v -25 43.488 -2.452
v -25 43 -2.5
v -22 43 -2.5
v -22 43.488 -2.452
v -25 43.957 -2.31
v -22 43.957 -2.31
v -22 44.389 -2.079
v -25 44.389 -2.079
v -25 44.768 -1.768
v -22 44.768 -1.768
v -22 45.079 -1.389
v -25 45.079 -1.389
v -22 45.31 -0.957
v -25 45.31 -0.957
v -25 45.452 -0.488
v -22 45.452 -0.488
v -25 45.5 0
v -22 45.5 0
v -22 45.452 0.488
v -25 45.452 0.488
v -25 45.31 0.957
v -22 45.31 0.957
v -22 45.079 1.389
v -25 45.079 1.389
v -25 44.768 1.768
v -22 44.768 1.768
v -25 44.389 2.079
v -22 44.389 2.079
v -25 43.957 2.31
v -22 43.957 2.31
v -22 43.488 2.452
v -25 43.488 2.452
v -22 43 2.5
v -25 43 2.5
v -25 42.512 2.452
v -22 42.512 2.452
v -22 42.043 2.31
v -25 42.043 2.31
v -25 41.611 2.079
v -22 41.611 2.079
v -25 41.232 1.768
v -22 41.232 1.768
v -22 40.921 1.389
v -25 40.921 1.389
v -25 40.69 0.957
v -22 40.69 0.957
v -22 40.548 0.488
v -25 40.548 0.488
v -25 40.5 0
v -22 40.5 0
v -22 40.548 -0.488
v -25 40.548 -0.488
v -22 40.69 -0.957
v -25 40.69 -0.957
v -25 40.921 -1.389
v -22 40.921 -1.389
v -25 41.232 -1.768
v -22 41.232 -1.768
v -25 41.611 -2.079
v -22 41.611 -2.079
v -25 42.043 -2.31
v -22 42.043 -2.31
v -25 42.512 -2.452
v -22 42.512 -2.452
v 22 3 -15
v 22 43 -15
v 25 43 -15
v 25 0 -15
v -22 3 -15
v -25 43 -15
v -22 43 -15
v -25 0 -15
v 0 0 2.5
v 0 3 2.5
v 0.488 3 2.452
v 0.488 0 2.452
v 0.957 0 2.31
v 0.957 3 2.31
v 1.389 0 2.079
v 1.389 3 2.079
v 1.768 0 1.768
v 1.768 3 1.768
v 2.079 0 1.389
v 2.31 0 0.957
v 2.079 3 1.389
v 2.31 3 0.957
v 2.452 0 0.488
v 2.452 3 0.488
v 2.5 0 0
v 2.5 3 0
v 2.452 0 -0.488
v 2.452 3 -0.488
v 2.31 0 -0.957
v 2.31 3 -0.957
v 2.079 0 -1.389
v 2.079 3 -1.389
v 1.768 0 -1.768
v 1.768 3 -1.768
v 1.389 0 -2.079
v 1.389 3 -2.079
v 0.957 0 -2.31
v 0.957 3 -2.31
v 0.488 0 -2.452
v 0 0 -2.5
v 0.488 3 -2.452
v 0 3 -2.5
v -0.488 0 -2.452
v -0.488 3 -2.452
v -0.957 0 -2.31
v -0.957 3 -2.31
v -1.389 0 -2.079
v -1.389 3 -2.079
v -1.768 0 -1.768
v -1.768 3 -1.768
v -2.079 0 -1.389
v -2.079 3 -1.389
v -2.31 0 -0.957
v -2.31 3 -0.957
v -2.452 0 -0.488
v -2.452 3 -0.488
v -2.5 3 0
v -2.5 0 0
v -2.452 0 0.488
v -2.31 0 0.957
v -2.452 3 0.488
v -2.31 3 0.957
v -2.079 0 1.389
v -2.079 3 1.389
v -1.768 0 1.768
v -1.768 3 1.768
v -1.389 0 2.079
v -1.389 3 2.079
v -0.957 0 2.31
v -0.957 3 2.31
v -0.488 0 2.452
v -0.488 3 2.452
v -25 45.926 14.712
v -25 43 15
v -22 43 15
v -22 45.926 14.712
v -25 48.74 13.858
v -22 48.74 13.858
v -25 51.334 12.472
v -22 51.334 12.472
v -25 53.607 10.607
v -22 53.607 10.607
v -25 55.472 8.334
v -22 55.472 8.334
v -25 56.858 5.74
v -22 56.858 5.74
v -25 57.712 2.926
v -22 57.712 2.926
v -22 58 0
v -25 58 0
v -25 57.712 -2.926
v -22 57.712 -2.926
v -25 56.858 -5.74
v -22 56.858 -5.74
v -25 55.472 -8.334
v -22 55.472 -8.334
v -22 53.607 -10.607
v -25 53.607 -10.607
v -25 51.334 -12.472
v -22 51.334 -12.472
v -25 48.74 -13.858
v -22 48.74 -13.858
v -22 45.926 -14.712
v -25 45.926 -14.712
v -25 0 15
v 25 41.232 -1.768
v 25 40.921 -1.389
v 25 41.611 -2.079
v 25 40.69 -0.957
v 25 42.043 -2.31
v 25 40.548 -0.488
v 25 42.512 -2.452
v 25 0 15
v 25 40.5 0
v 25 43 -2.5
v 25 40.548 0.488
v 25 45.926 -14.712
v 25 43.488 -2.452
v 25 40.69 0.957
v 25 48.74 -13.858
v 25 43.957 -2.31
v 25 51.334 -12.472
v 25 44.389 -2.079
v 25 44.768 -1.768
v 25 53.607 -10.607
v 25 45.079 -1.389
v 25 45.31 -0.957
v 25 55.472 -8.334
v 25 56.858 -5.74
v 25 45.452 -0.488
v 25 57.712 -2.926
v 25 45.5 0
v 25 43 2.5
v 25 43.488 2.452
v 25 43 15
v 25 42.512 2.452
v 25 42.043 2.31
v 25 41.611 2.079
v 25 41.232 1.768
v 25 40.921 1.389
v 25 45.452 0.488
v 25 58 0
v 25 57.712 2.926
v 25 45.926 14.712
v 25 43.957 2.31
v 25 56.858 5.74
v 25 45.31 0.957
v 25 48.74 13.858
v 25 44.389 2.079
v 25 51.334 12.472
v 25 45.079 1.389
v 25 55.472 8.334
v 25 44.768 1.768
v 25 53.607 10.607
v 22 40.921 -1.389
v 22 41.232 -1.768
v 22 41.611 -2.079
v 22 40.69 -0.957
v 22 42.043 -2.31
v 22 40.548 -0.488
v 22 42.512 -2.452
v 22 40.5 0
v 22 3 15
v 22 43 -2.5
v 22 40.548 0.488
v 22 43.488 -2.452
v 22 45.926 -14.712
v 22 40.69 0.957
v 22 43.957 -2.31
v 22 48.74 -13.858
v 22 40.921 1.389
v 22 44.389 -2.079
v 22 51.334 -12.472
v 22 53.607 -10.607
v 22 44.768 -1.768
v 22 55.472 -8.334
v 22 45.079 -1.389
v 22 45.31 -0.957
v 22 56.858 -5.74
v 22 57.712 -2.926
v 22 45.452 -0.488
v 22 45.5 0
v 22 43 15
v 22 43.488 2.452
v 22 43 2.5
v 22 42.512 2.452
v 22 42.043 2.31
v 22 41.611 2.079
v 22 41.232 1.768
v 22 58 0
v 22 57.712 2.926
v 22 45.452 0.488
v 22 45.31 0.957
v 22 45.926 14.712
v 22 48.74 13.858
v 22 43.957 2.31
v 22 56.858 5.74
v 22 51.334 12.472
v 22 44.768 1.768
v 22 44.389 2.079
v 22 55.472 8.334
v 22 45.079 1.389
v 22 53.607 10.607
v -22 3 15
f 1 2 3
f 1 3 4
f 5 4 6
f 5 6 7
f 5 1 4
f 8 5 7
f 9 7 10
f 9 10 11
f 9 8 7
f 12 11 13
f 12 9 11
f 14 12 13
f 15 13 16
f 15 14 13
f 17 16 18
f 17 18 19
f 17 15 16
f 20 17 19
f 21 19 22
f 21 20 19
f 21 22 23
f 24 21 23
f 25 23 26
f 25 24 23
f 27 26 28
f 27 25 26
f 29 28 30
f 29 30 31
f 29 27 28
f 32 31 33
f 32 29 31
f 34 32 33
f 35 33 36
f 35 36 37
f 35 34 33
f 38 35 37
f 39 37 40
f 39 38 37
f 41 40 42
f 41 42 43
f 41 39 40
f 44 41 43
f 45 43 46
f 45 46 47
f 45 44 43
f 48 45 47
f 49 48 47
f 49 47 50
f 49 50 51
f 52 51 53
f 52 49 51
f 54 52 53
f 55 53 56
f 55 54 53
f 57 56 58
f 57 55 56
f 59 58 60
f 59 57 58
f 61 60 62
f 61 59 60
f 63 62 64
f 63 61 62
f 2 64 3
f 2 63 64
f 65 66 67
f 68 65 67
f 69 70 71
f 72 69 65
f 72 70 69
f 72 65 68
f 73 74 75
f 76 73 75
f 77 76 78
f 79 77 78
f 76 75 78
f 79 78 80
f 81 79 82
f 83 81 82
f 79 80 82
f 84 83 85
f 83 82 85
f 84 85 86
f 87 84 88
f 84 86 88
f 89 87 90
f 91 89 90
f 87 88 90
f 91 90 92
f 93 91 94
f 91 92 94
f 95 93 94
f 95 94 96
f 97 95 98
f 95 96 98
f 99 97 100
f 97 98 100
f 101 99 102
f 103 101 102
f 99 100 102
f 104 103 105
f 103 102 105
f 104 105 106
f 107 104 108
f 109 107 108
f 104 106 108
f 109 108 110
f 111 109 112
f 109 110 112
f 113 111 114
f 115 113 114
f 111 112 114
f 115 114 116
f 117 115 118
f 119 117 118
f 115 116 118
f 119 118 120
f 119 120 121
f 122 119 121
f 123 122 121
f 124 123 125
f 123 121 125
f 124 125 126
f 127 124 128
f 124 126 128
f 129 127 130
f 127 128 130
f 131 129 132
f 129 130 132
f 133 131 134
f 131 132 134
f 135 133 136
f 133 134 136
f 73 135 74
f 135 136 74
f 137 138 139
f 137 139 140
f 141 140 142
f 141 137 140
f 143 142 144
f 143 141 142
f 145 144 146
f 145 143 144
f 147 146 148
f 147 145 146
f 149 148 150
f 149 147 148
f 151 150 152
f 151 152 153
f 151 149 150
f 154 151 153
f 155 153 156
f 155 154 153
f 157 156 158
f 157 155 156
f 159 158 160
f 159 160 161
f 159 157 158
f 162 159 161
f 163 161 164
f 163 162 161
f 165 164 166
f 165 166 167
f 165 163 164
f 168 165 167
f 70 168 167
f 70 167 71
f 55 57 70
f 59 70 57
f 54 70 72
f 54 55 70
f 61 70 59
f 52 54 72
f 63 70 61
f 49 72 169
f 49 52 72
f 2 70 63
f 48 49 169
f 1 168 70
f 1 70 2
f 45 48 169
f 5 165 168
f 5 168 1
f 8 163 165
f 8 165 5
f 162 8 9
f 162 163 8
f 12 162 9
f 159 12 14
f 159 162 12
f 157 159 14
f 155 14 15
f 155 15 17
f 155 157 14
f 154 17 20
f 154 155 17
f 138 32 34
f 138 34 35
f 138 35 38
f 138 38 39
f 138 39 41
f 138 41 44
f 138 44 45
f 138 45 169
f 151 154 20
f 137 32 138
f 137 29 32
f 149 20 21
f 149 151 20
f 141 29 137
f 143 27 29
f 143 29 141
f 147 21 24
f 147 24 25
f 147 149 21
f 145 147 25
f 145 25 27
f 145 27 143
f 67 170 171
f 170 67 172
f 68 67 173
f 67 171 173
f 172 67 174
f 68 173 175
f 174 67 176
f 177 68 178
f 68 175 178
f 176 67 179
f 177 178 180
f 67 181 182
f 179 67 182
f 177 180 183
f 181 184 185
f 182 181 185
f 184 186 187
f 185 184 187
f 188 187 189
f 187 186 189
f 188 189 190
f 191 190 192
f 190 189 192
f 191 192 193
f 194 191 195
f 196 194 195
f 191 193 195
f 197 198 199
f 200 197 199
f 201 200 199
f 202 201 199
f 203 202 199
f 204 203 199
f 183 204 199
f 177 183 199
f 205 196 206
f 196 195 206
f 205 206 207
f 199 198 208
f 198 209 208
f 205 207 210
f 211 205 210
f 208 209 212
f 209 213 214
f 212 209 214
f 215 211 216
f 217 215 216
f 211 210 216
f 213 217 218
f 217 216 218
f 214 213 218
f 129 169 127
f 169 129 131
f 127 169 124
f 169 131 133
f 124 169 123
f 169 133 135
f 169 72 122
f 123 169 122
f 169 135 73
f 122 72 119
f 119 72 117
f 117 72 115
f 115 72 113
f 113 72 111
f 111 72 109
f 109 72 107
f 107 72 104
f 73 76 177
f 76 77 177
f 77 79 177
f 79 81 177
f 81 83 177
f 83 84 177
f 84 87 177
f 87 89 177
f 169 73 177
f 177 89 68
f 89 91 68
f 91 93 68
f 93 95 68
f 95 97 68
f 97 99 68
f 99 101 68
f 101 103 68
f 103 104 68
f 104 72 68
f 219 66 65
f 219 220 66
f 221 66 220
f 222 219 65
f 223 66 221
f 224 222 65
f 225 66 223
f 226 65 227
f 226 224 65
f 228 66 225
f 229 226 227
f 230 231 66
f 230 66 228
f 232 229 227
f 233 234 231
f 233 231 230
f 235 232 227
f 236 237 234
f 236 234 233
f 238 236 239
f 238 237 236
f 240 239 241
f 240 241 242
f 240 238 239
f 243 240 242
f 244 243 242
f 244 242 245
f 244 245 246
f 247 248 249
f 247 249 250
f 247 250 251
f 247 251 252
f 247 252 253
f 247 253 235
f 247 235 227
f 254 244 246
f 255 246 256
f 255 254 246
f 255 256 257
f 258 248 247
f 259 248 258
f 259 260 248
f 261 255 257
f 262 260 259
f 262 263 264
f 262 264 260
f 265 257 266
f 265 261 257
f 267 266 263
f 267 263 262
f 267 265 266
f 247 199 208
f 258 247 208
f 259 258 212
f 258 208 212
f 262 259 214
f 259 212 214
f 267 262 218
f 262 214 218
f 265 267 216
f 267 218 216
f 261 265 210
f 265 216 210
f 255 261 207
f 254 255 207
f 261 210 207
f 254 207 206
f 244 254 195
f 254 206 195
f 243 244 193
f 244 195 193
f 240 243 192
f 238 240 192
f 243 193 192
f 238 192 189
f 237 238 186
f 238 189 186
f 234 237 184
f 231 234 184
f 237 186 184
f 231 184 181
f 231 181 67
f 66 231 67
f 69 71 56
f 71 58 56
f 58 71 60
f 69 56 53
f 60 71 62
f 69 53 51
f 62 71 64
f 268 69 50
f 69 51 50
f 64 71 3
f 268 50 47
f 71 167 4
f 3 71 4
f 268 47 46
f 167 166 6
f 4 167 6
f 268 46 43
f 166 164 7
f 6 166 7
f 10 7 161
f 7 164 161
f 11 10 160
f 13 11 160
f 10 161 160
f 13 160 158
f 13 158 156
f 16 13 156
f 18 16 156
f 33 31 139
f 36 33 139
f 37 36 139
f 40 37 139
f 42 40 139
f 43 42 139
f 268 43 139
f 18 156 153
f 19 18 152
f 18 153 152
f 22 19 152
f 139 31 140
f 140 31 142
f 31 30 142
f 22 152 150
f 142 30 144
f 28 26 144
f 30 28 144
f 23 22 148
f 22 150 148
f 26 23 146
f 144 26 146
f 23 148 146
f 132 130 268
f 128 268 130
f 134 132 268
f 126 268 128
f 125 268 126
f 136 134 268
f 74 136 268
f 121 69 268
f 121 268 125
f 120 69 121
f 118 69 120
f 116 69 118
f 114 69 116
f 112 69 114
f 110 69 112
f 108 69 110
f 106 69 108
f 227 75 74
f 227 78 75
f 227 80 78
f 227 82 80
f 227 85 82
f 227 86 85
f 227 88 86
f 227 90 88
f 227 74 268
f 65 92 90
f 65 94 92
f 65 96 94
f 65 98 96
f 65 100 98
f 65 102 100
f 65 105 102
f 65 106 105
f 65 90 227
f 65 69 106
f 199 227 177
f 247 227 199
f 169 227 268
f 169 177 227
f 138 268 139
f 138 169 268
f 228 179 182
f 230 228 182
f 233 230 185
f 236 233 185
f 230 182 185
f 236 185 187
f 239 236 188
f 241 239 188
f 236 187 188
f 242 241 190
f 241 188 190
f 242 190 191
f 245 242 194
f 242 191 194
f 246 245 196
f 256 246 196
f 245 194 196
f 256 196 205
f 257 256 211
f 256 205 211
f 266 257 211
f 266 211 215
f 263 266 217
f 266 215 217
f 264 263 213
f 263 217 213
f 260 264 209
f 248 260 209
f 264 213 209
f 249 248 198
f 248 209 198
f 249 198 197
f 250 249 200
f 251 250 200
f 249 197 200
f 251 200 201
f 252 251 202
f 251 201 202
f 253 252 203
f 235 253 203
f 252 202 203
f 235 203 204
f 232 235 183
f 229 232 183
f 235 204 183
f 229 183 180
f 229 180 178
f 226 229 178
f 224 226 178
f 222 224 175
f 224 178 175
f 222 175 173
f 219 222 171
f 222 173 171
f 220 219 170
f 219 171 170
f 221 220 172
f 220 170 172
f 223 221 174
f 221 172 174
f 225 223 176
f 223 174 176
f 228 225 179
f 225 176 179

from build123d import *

# Parameters (mm, degrees)
SKETCH1_W           = 50
SKETCH1_H           = 30
BOSS_EXTRUDE1_DEPTH = 3
SKETCH2_R           = 2.5
BOSS_EXTRUDE2_DEPTH = 3
SKETCH3_R           = 2.5
CUT_EXTRUDE1_DEPTH  = 3


with BuildPart() as part:
    # Sketch1 → Boss-Extrude1 (new body)
    with BuildSketch(Plane(origin=(0, 0, 0), x_dir=(1, 0, 0), z_dir=(0, 1, 0))):
        Rectangle(SKETCH1_W, SKETCH1_H)
    extrude(amount=BOSS_EXTRUDE1_DEPTH)

    # Sketch2 → Boss-Extrude2 (add)
    with BuildSketch(Plane(origin=(25, 0, 0), x_dir=(0, 0, -1), z_dir=(1, 0, 0))):
        with BuildLine():
            Line((-15, 3), (-15, 43))
            ThreePointArc((-15, 43), (0, 58), (15, 43))
            Line((15, 43), (15, 3))
            Line((15, 3), (-15, 3))
        make_face()
        with Locations((0, 43)):
            Circle(SKETCH2_R, mode=Mode.SUBTRACT)
    boss_extrude2 = extrude(amount=-BOSS_EXTRUDE2_DEPTH)

    # Mirror1: Boss-Extrude2 across plane
    add(boss_extrude2.mirror(Plane(origin=(0, 0, 0), x_dir=(0, 0, 1), z_dir=(1, 0, 0))))

    # Sketch3 → Cut-Extrude1 (cut)
    with BuildSketch(Plane(origin=(0, 3, 0), x_dir=(1, 0, 0), z_dir=(0, 1, 0))):
        with Locations(Location((0, 0, 0), (0, 0, 270))):
            Circle(SKETCH3_R)
    extrude(amount=-CUT_EXTRUDE1_DEPTH, mode=Mode.SUBTRACT)


solid = part.part
